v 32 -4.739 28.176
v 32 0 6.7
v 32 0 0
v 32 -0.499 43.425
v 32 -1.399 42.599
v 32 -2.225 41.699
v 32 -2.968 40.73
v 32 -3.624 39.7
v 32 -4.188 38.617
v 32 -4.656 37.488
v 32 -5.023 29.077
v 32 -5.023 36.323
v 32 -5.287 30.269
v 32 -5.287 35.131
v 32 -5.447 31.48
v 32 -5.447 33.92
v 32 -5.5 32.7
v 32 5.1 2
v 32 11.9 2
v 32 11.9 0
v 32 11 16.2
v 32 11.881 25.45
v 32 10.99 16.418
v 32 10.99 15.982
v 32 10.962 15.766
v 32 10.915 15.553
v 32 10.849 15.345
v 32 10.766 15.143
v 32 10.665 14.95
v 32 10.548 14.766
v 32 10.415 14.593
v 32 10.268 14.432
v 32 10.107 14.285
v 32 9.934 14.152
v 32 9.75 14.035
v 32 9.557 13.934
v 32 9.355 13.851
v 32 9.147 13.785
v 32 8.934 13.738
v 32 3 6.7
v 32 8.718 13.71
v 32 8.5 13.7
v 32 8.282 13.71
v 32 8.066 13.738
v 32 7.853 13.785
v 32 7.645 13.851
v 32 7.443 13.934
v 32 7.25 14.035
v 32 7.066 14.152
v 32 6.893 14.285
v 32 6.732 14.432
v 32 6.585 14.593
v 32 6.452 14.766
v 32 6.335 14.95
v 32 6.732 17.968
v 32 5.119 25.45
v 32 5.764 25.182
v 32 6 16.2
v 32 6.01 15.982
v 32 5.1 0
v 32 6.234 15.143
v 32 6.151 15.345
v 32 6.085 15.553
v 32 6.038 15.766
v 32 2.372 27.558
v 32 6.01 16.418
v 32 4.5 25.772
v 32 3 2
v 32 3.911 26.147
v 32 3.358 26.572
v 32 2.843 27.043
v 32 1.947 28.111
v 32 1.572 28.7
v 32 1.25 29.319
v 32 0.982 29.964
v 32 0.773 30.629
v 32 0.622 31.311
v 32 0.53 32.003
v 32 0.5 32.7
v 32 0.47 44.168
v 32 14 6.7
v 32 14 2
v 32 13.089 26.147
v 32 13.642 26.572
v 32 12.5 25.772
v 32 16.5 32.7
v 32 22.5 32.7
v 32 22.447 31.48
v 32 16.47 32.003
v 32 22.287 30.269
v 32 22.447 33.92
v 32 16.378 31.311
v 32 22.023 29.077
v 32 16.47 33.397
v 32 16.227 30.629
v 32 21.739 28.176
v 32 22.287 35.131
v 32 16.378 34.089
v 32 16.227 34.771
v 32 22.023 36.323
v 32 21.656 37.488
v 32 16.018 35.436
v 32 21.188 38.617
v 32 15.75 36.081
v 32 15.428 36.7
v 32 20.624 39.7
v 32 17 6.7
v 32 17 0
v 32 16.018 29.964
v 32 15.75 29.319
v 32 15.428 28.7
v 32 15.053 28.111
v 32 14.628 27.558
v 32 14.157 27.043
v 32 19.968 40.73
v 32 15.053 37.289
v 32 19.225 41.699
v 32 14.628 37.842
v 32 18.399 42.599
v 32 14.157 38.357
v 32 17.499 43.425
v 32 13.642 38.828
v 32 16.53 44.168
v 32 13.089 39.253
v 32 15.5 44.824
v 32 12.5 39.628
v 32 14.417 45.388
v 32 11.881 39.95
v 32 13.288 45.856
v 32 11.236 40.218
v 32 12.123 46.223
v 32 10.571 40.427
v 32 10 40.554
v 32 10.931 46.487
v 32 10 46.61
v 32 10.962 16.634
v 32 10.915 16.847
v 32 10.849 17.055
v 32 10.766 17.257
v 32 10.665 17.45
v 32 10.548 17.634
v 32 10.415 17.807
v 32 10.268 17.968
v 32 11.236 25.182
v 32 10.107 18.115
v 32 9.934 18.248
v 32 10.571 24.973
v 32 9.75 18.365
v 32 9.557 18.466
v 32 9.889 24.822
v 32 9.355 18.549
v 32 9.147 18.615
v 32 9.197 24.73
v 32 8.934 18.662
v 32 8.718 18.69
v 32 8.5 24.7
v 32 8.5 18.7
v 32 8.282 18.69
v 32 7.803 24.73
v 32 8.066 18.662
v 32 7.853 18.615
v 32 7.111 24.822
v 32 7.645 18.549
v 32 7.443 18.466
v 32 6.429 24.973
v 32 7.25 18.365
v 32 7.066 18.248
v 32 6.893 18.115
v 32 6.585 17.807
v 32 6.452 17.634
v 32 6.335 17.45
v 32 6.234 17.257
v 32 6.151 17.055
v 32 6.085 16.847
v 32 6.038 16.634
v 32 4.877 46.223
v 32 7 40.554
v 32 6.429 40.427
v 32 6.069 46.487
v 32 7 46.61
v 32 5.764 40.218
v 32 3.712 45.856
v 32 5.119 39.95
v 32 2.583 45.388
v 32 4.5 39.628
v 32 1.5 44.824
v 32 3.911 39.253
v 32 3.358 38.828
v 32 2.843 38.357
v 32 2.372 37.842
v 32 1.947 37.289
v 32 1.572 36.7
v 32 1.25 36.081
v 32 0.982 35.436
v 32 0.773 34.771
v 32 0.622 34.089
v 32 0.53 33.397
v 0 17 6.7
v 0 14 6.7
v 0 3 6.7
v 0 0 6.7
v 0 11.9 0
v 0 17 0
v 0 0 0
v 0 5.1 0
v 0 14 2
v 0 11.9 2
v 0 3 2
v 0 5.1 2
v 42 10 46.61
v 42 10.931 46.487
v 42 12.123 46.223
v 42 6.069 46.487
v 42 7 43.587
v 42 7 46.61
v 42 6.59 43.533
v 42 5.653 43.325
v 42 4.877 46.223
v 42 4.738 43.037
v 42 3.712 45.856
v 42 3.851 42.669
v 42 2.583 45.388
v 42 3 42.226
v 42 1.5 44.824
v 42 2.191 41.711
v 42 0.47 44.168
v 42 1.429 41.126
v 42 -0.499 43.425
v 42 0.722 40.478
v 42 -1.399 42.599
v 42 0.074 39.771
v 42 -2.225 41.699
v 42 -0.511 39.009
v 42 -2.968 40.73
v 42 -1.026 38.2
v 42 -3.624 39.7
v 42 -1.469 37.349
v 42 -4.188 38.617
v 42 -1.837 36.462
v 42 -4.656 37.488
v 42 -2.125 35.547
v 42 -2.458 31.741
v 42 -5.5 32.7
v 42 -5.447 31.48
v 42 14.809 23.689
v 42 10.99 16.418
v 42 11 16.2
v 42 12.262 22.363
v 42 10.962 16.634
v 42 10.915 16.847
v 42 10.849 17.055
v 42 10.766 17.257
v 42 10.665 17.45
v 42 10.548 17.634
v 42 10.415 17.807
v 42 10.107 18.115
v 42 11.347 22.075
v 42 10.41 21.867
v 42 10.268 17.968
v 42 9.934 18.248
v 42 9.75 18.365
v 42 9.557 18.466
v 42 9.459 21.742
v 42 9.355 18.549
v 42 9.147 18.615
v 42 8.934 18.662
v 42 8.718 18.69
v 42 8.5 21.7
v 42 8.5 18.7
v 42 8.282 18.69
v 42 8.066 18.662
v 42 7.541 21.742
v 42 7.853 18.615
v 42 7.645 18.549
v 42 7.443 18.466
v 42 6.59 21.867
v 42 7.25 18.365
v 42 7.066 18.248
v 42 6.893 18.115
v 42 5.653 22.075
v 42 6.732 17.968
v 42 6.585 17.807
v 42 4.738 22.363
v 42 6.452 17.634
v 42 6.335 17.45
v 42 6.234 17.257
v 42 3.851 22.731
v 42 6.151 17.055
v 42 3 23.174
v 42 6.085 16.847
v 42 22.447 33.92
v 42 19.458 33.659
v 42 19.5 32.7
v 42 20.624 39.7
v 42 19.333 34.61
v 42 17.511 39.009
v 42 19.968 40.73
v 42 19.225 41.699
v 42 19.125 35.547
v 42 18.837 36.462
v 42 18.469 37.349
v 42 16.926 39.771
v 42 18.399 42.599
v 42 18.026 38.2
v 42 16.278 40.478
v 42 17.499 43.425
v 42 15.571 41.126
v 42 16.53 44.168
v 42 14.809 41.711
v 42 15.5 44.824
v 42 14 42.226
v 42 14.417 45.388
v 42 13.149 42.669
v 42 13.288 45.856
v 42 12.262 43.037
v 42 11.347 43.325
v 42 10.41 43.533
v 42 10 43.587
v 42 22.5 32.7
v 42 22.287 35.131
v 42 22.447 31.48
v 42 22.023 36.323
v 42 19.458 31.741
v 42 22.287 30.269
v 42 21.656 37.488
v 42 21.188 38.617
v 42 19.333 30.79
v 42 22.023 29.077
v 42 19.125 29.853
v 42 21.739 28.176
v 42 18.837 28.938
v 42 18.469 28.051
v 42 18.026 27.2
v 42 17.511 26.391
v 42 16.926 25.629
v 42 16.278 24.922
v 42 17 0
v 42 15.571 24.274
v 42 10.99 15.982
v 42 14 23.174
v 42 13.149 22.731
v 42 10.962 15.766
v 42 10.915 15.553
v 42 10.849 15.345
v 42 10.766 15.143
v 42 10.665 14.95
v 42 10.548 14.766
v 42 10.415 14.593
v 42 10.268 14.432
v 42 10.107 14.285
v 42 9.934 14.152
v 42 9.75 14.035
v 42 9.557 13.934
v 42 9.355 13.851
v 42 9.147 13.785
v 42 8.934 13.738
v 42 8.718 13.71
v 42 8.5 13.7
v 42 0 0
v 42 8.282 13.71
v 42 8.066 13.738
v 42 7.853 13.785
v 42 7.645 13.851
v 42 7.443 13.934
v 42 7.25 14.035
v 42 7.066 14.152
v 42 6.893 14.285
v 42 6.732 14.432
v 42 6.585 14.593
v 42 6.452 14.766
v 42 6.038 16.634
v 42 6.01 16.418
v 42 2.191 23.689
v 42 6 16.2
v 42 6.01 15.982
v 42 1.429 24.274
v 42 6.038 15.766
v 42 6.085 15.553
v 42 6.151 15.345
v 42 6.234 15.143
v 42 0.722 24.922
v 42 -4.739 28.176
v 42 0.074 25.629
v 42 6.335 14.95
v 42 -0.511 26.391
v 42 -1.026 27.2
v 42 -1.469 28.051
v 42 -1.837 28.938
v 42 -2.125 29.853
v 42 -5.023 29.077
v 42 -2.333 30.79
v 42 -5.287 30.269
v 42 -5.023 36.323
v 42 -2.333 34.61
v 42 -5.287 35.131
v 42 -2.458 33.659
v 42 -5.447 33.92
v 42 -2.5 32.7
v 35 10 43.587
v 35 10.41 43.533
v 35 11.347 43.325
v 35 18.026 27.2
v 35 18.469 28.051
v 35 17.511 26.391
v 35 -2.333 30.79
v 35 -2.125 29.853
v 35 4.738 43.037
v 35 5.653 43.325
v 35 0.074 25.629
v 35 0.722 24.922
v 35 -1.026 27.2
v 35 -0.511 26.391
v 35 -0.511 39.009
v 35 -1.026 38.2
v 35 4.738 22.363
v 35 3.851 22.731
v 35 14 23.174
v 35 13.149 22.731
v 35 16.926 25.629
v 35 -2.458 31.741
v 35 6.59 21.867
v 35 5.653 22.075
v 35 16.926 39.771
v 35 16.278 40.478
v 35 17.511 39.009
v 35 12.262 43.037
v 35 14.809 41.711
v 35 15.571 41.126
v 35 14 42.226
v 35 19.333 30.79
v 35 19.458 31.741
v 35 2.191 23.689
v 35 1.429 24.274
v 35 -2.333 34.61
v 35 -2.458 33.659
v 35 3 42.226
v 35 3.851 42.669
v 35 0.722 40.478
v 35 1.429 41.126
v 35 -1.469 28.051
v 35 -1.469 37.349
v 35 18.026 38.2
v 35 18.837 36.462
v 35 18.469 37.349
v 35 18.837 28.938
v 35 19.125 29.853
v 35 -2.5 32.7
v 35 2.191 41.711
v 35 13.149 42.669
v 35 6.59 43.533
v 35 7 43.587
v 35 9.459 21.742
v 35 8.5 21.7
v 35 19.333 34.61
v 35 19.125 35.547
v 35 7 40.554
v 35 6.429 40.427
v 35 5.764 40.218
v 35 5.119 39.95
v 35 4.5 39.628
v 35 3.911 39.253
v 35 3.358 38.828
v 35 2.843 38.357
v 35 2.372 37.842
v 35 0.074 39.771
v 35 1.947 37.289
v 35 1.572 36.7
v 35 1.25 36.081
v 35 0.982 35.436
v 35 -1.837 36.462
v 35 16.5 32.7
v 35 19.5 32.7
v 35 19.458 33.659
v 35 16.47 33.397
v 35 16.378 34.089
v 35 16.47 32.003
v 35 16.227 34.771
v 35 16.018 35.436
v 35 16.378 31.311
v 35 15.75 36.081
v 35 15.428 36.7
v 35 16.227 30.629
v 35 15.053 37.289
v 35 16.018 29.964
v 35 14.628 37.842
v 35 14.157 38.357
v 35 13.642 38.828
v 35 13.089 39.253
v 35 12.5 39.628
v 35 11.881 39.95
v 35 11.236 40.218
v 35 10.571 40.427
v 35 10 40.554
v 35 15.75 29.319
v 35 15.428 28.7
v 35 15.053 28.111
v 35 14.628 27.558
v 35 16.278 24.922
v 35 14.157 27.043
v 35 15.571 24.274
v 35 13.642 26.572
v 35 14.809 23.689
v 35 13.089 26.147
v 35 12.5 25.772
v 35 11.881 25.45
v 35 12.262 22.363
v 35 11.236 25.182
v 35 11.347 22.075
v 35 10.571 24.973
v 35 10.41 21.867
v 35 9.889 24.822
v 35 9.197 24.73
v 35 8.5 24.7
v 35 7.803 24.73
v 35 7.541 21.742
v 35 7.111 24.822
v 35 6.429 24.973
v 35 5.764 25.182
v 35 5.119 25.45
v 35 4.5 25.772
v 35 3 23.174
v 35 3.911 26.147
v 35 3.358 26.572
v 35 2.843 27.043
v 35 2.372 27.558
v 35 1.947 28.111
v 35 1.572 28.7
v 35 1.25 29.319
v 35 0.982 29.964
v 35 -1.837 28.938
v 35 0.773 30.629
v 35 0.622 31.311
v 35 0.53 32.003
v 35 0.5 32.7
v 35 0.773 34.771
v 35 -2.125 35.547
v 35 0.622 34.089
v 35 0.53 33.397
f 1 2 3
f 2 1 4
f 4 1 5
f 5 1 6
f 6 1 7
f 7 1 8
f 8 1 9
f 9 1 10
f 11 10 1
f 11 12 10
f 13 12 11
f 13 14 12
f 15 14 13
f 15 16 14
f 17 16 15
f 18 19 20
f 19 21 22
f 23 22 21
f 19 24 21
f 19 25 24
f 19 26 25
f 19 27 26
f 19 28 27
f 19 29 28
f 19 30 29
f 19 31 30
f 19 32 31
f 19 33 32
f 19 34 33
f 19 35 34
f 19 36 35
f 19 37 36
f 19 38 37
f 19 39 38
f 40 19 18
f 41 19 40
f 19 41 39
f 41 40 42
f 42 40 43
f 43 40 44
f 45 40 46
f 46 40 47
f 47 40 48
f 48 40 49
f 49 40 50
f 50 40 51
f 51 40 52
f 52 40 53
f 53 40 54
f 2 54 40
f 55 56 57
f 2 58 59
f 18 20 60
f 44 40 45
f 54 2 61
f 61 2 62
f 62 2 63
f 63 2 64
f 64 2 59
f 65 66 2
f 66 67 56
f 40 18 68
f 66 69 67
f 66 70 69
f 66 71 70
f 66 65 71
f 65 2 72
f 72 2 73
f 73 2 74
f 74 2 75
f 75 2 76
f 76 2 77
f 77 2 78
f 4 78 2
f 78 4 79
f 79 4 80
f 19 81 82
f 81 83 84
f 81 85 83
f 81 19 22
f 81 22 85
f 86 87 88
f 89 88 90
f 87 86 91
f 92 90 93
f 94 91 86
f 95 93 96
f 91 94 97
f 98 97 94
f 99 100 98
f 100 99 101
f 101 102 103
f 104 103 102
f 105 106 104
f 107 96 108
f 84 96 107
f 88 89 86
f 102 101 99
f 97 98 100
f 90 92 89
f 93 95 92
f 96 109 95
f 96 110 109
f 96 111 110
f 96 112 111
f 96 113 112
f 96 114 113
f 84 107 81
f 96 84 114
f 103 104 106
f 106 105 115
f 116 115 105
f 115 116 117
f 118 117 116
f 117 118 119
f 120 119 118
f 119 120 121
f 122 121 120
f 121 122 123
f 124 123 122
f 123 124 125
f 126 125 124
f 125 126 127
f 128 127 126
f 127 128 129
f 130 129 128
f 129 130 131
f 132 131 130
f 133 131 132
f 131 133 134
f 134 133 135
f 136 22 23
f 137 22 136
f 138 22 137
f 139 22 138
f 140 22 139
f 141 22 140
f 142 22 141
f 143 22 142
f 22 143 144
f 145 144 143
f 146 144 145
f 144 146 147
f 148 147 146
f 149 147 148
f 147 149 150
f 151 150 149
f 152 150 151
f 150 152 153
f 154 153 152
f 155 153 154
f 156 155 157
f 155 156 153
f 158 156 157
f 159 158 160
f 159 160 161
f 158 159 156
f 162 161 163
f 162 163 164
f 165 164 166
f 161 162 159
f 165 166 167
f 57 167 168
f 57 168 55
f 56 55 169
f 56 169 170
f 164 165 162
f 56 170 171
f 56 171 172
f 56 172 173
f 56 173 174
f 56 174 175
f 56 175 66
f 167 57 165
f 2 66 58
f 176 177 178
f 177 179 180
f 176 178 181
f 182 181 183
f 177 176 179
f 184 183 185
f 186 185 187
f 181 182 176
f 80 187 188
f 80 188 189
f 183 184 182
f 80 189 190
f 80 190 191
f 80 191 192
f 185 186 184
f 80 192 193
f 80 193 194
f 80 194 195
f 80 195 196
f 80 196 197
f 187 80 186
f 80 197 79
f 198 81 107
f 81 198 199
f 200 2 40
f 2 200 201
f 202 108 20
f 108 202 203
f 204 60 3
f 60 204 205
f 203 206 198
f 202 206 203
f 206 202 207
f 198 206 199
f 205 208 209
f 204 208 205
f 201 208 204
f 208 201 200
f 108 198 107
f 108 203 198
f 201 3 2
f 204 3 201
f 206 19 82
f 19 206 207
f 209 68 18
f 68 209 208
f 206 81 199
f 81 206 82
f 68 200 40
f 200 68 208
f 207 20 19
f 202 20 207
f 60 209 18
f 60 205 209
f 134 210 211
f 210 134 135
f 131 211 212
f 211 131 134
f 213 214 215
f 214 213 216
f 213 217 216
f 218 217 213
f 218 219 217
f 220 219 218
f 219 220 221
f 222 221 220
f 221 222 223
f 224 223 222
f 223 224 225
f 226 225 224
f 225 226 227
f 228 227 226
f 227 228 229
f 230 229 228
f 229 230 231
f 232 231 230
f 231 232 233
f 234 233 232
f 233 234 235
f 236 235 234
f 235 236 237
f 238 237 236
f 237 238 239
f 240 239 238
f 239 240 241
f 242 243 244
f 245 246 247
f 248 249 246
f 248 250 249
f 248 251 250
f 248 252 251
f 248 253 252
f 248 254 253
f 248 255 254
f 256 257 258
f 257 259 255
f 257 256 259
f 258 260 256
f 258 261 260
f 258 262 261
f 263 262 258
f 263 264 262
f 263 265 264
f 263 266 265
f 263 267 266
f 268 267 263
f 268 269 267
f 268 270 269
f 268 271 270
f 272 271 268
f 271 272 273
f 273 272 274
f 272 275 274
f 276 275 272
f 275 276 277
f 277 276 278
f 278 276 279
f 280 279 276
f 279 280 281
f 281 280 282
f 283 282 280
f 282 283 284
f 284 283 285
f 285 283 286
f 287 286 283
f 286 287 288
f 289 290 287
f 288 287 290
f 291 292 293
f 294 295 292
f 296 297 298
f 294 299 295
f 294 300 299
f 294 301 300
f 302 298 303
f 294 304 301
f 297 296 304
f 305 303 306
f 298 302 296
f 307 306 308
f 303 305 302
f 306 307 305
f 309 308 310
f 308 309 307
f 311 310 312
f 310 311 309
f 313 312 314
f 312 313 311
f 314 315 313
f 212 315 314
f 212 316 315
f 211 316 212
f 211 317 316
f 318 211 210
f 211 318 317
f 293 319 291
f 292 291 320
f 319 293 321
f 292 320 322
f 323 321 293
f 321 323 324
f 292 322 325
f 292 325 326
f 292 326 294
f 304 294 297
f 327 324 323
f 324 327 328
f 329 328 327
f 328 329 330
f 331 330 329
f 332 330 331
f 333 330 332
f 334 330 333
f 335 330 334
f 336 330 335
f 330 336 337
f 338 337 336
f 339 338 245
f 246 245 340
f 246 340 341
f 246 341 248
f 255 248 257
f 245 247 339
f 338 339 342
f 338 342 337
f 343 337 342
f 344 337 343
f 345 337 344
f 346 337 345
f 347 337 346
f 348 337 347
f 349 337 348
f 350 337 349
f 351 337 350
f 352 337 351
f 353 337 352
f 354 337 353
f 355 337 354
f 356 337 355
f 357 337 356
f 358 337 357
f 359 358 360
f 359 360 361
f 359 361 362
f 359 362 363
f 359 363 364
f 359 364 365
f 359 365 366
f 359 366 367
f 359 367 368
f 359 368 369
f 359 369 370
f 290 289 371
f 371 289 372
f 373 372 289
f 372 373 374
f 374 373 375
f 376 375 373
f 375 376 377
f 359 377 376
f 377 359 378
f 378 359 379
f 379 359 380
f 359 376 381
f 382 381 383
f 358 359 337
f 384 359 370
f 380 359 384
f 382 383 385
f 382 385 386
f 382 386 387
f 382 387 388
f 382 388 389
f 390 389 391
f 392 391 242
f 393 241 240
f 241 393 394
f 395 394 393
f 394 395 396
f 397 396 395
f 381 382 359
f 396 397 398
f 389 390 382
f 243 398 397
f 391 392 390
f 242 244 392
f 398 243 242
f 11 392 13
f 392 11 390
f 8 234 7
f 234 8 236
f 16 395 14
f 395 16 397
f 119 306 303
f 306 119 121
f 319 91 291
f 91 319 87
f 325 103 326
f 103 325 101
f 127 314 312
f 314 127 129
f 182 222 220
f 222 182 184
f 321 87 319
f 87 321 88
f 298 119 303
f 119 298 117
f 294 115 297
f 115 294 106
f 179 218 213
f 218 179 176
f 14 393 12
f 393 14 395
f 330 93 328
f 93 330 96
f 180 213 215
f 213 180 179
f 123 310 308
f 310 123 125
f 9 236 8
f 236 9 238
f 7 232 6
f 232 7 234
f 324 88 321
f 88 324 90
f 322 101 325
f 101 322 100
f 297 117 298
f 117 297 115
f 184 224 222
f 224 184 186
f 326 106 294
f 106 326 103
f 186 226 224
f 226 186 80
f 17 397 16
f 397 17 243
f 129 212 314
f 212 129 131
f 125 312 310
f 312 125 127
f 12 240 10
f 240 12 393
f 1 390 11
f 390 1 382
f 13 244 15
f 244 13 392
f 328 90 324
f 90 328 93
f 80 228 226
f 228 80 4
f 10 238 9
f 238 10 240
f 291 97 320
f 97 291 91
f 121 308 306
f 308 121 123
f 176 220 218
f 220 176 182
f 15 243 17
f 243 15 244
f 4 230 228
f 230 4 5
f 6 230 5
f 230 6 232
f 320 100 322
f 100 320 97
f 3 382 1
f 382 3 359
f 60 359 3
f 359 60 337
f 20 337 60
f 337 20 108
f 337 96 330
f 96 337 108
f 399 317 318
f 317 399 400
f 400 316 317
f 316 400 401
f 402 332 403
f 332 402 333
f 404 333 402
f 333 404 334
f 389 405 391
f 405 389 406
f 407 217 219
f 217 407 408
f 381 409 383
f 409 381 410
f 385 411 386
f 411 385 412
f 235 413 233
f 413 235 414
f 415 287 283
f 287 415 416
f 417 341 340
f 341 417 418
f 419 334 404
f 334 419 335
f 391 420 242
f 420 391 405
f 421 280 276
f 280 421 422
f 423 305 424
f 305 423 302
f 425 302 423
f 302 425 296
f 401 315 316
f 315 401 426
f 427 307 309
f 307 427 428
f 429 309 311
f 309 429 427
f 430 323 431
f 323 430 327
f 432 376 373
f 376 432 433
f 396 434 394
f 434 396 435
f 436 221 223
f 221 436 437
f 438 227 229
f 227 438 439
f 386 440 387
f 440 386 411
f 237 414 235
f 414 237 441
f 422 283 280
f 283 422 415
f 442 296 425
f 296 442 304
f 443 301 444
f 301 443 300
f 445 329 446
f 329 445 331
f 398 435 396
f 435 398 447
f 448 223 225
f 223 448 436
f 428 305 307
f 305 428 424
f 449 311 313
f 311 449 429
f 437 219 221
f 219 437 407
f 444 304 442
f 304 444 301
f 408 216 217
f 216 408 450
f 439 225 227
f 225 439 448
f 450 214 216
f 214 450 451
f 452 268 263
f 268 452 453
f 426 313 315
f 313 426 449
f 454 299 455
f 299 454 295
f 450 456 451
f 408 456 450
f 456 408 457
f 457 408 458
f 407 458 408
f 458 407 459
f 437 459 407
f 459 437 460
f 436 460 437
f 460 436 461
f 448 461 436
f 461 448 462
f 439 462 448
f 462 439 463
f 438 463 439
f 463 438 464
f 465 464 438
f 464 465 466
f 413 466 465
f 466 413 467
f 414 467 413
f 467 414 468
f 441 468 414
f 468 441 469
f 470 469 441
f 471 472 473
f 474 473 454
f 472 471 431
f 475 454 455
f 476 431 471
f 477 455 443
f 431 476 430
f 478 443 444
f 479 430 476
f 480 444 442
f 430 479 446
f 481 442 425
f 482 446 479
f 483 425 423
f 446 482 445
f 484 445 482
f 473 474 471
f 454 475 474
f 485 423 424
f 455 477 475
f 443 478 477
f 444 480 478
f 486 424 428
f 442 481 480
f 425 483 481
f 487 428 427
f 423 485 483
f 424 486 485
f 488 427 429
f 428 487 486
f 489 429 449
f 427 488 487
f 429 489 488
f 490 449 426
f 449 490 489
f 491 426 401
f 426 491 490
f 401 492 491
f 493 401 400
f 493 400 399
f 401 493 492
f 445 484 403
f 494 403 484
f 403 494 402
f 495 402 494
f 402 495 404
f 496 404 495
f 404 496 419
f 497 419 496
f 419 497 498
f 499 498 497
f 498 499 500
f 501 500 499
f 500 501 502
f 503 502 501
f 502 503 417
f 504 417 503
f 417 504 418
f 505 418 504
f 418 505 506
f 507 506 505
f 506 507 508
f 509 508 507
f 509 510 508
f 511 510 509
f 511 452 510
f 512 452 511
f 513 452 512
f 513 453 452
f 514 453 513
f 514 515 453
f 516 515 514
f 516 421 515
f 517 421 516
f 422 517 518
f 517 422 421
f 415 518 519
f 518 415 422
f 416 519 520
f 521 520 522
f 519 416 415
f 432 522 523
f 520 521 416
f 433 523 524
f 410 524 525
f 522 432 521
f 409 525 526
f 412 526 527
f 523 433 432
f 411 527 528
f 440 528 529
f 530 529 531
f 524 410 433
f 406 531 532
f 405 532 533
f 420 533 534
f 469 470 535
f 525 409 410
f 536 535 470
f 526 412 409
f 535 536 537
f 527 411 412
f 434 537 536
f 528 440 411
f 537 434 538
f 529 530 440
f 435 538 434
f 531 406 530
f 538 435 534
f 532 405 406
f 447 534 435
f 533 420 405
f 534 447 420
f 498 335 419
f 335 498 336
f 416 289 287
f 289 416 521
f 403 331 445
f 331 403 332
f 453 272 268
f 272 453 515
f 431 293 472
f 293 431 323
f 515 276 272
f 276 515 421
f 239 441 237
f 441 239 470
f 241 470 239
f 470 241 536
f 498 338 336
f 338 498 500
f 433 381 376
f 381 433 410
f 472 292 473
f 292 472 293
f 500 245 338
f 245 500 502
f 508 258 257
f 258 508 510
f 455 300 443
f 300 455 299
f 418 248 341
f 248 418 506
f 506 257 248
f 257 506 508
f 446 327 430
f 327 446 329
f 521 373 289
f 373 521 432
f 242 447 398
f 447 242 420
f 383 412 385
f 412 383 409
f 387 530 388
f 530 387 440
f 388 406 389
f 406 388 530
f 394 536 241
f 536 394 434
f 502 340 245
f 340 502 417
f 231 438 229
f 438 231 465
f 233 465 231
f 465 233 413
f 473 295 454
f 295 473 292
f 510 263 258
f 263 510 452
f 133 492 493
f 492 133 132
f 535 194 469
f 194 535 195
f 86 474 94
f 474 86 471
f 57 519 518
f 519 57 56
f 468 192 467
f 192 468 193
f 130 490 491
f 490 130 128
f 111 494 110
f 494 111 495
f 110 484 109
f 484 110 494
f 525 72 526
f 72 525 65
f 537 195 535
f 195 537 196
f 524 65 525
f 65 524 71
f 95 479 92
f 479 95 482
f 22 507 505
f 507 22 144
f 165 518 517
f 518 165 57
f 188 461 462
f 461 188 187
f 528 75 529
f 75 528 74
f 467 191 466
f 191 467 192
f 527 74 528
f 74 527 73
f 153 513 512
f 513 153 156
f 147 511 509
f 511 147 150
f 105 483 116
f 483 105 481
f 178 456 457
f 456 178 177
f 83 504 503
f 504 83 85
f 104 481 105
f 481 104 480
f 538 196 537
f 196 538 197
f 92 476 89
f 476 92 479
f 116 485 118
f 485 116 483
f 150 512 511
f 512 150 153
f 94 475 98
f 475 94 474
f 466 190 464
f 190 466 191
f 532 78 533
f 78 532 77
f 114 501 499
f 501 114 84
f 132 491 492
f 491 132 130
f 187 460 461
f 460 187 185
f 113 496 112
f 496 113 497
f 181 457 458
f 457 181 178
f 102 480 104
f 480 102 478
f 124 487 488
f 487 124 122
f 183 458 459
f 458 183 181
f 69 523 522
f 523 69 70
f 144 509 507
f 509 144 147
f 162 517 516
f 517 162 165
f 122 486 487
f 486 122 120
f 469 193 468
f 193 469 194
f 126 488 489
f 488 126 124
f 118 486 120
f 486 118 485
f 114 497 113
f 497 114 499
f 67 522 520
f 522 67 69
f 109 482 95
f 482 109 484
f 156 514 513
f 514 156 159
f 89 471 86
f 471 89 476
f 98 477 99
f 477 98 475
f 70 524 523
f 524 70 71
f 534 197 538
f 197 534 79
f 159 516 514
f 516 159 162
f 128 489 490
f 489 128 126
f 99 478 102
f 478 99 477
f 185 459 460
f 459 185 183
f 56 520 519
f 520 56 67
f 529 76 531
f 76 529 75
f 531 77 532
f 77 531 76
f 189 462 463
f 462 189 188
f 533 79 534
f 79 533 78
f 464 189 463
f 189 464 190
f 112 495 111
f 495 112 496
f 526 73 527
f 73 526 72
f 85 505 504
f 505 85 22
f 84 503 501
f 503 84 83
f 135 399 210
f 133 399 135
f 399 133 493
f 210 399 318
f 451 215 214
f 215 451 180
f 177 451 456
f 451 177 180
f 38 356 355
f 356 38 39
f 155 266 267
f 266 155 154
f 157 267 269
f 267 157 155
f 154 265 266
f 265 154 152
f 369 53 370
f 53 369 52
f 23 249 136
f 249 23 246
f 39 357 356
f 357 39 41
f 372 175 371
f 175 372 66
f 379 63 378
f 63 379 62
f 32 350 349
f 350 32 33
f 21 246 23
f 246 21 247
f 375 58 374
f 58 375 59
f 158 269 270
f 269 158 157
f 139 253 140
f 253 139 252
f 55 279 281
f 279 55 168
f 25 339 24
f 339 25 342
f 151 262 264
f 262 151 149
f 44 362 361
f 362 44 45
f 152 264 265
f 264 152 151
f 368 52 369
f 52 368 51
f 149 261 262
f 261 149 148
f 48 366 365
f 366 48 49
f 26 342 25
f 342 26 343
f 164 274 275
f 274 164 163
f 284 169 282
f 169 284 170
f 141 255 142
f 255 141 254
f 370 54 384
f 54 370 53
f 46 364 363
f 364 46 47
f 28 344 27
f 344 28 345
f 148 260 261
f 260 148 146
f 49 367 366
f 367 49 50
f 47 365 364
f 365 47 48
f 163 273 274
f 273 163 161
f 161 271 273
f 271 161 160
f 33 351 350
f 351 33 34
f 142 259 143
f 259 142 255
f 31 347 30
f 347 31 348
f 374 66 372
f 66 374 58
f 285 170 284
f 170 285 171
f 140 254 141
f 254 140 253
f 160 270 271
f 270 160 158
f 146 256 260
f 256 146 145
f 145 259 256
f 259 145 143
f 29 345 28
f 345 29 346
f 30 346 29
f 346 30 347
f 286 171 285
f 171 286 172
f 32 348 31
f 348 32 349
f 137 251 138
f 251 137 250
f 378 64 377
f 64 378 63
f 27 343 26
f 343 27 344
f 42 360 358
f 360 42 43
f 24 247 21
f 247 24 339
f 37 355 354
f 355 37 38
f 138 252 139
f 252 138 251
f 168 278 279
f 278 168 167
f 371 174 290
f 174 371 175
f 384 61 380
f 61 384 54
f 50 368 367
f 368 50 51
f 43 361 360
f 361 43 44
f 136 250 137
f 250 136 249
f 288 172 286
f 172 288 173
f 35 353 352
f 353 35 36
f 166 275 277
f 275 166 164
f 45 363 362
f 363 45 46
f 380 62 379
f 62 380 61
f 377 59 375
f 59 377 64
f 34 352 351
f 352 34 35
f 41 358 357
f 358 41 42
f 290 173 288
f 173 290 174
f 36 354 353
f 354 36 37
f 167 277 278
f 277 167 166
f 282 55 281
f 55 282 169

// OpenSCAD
Gap = 0.2;
$fn = 72;

FrameToBearingL();

module FrameToBearingL() {
    Thickness = 3.0;

    BearingRadius = 11.0;
    BearingInnerRadius = BearingRadius - Thickness;
    BearingHeight = 7.0;

    MountingRadius = BearingRadius + Thickness;

    HeadDiameter = 11.0;
    HeadHeight = 4.5 + Gap;

    ThreadDiameter = 6.6 + Gap; // I measured 6.2, but RodToBearingCoupling uses 6.5 for a snug fit
    ThreadHeight = 2.0;

    FrameAdapterWidth = HeadDiameter + 2*Thickness;
    FrameAdapterLength = 32;
    FrameAdapterHeight = ThreadHeight + HeadHeight;

    MotorRadius = 26.0;
    BearingAdapterOffset = MotorRadius + FrameAdapterHeight;
    BearingAdapterShift = 0;

    GuideRodSnugRadius = 2.5;
    MotorInnerRadius = 12.5;
    GuideRodOffset = MotorInnerRadius + Thickness/2 + GuideRodSnugRadius;

    ToTheSky = 50;

    union() {
        // Frame adapter
        difference() {
            cube([FrameAdapterLength, FrameAdapterWidth, FrameAdapterHeight]);

            // Volume of the nut head
            translate([0, Thickness, ThreadHeight])
                cube([FrameAdapterLength, HeadDiameter, HeadHeight]);

            // Volume of the nut thread
            translate([0, Thickness + (HeadDiameter - ThreadDiameter)/2, 0])
                cube([FrameAdapterLength, ThreadDiameter, ThreadHeight]);
        }

        // Bearing adapter
        rotate([0, -90, 0])
        translate([BearingAdapterOffset, FrameAdapterWidth/2, -FrameAdapterLength -(BearingHeight+Thickness)/2])
        difference() {
            union()
            {
                // Bearing adapter
                cylinder(r = MountingRadius, h=BearingHeight + Thickness, center=true);

                // Connection to frame adapter
                translate([-BearingAdapterOffset/2, 0, 0])
                linear_extrude(height = BearingHeight + Thickness, center = true)
                    polygon(points = [
                    [-BearingAdapterOffset/2, -FrameAdapterWidth/2],
                    [BearingAdapterOffset/2, -MountingRadius],
                    [BearingAdapterOffset/2, MountingRadius],
                    [-BearingAdapterOffset/2, FrameAdapterWidth/2],
                    ]);
            }
            union() {
                // Volume of bearing
                translate([0, 0, -Thickness/2])
                    cylinder(r = BearingRadius, h=BearingHeight, center=true);

                translate([0, 0, Thickness/2])
                    cylinder(r = BearingInnerRadius, h=BearingHeight, center=true);

                // Don't fully enclose the bearing at x=Length
                translate([0, -Thickness/2, -ToTheSky/2])
                    cube([ToTheSky, Thickness, ToTheSky]);

                // Guide rod
                translate([-GuideRodOffset, 0, -(BearingHeight + Thickness)/2])
                    cylinder(r = GuideRodSnugRadius, h = BearingHeight + Thickness);
            }
        }
    }
}
